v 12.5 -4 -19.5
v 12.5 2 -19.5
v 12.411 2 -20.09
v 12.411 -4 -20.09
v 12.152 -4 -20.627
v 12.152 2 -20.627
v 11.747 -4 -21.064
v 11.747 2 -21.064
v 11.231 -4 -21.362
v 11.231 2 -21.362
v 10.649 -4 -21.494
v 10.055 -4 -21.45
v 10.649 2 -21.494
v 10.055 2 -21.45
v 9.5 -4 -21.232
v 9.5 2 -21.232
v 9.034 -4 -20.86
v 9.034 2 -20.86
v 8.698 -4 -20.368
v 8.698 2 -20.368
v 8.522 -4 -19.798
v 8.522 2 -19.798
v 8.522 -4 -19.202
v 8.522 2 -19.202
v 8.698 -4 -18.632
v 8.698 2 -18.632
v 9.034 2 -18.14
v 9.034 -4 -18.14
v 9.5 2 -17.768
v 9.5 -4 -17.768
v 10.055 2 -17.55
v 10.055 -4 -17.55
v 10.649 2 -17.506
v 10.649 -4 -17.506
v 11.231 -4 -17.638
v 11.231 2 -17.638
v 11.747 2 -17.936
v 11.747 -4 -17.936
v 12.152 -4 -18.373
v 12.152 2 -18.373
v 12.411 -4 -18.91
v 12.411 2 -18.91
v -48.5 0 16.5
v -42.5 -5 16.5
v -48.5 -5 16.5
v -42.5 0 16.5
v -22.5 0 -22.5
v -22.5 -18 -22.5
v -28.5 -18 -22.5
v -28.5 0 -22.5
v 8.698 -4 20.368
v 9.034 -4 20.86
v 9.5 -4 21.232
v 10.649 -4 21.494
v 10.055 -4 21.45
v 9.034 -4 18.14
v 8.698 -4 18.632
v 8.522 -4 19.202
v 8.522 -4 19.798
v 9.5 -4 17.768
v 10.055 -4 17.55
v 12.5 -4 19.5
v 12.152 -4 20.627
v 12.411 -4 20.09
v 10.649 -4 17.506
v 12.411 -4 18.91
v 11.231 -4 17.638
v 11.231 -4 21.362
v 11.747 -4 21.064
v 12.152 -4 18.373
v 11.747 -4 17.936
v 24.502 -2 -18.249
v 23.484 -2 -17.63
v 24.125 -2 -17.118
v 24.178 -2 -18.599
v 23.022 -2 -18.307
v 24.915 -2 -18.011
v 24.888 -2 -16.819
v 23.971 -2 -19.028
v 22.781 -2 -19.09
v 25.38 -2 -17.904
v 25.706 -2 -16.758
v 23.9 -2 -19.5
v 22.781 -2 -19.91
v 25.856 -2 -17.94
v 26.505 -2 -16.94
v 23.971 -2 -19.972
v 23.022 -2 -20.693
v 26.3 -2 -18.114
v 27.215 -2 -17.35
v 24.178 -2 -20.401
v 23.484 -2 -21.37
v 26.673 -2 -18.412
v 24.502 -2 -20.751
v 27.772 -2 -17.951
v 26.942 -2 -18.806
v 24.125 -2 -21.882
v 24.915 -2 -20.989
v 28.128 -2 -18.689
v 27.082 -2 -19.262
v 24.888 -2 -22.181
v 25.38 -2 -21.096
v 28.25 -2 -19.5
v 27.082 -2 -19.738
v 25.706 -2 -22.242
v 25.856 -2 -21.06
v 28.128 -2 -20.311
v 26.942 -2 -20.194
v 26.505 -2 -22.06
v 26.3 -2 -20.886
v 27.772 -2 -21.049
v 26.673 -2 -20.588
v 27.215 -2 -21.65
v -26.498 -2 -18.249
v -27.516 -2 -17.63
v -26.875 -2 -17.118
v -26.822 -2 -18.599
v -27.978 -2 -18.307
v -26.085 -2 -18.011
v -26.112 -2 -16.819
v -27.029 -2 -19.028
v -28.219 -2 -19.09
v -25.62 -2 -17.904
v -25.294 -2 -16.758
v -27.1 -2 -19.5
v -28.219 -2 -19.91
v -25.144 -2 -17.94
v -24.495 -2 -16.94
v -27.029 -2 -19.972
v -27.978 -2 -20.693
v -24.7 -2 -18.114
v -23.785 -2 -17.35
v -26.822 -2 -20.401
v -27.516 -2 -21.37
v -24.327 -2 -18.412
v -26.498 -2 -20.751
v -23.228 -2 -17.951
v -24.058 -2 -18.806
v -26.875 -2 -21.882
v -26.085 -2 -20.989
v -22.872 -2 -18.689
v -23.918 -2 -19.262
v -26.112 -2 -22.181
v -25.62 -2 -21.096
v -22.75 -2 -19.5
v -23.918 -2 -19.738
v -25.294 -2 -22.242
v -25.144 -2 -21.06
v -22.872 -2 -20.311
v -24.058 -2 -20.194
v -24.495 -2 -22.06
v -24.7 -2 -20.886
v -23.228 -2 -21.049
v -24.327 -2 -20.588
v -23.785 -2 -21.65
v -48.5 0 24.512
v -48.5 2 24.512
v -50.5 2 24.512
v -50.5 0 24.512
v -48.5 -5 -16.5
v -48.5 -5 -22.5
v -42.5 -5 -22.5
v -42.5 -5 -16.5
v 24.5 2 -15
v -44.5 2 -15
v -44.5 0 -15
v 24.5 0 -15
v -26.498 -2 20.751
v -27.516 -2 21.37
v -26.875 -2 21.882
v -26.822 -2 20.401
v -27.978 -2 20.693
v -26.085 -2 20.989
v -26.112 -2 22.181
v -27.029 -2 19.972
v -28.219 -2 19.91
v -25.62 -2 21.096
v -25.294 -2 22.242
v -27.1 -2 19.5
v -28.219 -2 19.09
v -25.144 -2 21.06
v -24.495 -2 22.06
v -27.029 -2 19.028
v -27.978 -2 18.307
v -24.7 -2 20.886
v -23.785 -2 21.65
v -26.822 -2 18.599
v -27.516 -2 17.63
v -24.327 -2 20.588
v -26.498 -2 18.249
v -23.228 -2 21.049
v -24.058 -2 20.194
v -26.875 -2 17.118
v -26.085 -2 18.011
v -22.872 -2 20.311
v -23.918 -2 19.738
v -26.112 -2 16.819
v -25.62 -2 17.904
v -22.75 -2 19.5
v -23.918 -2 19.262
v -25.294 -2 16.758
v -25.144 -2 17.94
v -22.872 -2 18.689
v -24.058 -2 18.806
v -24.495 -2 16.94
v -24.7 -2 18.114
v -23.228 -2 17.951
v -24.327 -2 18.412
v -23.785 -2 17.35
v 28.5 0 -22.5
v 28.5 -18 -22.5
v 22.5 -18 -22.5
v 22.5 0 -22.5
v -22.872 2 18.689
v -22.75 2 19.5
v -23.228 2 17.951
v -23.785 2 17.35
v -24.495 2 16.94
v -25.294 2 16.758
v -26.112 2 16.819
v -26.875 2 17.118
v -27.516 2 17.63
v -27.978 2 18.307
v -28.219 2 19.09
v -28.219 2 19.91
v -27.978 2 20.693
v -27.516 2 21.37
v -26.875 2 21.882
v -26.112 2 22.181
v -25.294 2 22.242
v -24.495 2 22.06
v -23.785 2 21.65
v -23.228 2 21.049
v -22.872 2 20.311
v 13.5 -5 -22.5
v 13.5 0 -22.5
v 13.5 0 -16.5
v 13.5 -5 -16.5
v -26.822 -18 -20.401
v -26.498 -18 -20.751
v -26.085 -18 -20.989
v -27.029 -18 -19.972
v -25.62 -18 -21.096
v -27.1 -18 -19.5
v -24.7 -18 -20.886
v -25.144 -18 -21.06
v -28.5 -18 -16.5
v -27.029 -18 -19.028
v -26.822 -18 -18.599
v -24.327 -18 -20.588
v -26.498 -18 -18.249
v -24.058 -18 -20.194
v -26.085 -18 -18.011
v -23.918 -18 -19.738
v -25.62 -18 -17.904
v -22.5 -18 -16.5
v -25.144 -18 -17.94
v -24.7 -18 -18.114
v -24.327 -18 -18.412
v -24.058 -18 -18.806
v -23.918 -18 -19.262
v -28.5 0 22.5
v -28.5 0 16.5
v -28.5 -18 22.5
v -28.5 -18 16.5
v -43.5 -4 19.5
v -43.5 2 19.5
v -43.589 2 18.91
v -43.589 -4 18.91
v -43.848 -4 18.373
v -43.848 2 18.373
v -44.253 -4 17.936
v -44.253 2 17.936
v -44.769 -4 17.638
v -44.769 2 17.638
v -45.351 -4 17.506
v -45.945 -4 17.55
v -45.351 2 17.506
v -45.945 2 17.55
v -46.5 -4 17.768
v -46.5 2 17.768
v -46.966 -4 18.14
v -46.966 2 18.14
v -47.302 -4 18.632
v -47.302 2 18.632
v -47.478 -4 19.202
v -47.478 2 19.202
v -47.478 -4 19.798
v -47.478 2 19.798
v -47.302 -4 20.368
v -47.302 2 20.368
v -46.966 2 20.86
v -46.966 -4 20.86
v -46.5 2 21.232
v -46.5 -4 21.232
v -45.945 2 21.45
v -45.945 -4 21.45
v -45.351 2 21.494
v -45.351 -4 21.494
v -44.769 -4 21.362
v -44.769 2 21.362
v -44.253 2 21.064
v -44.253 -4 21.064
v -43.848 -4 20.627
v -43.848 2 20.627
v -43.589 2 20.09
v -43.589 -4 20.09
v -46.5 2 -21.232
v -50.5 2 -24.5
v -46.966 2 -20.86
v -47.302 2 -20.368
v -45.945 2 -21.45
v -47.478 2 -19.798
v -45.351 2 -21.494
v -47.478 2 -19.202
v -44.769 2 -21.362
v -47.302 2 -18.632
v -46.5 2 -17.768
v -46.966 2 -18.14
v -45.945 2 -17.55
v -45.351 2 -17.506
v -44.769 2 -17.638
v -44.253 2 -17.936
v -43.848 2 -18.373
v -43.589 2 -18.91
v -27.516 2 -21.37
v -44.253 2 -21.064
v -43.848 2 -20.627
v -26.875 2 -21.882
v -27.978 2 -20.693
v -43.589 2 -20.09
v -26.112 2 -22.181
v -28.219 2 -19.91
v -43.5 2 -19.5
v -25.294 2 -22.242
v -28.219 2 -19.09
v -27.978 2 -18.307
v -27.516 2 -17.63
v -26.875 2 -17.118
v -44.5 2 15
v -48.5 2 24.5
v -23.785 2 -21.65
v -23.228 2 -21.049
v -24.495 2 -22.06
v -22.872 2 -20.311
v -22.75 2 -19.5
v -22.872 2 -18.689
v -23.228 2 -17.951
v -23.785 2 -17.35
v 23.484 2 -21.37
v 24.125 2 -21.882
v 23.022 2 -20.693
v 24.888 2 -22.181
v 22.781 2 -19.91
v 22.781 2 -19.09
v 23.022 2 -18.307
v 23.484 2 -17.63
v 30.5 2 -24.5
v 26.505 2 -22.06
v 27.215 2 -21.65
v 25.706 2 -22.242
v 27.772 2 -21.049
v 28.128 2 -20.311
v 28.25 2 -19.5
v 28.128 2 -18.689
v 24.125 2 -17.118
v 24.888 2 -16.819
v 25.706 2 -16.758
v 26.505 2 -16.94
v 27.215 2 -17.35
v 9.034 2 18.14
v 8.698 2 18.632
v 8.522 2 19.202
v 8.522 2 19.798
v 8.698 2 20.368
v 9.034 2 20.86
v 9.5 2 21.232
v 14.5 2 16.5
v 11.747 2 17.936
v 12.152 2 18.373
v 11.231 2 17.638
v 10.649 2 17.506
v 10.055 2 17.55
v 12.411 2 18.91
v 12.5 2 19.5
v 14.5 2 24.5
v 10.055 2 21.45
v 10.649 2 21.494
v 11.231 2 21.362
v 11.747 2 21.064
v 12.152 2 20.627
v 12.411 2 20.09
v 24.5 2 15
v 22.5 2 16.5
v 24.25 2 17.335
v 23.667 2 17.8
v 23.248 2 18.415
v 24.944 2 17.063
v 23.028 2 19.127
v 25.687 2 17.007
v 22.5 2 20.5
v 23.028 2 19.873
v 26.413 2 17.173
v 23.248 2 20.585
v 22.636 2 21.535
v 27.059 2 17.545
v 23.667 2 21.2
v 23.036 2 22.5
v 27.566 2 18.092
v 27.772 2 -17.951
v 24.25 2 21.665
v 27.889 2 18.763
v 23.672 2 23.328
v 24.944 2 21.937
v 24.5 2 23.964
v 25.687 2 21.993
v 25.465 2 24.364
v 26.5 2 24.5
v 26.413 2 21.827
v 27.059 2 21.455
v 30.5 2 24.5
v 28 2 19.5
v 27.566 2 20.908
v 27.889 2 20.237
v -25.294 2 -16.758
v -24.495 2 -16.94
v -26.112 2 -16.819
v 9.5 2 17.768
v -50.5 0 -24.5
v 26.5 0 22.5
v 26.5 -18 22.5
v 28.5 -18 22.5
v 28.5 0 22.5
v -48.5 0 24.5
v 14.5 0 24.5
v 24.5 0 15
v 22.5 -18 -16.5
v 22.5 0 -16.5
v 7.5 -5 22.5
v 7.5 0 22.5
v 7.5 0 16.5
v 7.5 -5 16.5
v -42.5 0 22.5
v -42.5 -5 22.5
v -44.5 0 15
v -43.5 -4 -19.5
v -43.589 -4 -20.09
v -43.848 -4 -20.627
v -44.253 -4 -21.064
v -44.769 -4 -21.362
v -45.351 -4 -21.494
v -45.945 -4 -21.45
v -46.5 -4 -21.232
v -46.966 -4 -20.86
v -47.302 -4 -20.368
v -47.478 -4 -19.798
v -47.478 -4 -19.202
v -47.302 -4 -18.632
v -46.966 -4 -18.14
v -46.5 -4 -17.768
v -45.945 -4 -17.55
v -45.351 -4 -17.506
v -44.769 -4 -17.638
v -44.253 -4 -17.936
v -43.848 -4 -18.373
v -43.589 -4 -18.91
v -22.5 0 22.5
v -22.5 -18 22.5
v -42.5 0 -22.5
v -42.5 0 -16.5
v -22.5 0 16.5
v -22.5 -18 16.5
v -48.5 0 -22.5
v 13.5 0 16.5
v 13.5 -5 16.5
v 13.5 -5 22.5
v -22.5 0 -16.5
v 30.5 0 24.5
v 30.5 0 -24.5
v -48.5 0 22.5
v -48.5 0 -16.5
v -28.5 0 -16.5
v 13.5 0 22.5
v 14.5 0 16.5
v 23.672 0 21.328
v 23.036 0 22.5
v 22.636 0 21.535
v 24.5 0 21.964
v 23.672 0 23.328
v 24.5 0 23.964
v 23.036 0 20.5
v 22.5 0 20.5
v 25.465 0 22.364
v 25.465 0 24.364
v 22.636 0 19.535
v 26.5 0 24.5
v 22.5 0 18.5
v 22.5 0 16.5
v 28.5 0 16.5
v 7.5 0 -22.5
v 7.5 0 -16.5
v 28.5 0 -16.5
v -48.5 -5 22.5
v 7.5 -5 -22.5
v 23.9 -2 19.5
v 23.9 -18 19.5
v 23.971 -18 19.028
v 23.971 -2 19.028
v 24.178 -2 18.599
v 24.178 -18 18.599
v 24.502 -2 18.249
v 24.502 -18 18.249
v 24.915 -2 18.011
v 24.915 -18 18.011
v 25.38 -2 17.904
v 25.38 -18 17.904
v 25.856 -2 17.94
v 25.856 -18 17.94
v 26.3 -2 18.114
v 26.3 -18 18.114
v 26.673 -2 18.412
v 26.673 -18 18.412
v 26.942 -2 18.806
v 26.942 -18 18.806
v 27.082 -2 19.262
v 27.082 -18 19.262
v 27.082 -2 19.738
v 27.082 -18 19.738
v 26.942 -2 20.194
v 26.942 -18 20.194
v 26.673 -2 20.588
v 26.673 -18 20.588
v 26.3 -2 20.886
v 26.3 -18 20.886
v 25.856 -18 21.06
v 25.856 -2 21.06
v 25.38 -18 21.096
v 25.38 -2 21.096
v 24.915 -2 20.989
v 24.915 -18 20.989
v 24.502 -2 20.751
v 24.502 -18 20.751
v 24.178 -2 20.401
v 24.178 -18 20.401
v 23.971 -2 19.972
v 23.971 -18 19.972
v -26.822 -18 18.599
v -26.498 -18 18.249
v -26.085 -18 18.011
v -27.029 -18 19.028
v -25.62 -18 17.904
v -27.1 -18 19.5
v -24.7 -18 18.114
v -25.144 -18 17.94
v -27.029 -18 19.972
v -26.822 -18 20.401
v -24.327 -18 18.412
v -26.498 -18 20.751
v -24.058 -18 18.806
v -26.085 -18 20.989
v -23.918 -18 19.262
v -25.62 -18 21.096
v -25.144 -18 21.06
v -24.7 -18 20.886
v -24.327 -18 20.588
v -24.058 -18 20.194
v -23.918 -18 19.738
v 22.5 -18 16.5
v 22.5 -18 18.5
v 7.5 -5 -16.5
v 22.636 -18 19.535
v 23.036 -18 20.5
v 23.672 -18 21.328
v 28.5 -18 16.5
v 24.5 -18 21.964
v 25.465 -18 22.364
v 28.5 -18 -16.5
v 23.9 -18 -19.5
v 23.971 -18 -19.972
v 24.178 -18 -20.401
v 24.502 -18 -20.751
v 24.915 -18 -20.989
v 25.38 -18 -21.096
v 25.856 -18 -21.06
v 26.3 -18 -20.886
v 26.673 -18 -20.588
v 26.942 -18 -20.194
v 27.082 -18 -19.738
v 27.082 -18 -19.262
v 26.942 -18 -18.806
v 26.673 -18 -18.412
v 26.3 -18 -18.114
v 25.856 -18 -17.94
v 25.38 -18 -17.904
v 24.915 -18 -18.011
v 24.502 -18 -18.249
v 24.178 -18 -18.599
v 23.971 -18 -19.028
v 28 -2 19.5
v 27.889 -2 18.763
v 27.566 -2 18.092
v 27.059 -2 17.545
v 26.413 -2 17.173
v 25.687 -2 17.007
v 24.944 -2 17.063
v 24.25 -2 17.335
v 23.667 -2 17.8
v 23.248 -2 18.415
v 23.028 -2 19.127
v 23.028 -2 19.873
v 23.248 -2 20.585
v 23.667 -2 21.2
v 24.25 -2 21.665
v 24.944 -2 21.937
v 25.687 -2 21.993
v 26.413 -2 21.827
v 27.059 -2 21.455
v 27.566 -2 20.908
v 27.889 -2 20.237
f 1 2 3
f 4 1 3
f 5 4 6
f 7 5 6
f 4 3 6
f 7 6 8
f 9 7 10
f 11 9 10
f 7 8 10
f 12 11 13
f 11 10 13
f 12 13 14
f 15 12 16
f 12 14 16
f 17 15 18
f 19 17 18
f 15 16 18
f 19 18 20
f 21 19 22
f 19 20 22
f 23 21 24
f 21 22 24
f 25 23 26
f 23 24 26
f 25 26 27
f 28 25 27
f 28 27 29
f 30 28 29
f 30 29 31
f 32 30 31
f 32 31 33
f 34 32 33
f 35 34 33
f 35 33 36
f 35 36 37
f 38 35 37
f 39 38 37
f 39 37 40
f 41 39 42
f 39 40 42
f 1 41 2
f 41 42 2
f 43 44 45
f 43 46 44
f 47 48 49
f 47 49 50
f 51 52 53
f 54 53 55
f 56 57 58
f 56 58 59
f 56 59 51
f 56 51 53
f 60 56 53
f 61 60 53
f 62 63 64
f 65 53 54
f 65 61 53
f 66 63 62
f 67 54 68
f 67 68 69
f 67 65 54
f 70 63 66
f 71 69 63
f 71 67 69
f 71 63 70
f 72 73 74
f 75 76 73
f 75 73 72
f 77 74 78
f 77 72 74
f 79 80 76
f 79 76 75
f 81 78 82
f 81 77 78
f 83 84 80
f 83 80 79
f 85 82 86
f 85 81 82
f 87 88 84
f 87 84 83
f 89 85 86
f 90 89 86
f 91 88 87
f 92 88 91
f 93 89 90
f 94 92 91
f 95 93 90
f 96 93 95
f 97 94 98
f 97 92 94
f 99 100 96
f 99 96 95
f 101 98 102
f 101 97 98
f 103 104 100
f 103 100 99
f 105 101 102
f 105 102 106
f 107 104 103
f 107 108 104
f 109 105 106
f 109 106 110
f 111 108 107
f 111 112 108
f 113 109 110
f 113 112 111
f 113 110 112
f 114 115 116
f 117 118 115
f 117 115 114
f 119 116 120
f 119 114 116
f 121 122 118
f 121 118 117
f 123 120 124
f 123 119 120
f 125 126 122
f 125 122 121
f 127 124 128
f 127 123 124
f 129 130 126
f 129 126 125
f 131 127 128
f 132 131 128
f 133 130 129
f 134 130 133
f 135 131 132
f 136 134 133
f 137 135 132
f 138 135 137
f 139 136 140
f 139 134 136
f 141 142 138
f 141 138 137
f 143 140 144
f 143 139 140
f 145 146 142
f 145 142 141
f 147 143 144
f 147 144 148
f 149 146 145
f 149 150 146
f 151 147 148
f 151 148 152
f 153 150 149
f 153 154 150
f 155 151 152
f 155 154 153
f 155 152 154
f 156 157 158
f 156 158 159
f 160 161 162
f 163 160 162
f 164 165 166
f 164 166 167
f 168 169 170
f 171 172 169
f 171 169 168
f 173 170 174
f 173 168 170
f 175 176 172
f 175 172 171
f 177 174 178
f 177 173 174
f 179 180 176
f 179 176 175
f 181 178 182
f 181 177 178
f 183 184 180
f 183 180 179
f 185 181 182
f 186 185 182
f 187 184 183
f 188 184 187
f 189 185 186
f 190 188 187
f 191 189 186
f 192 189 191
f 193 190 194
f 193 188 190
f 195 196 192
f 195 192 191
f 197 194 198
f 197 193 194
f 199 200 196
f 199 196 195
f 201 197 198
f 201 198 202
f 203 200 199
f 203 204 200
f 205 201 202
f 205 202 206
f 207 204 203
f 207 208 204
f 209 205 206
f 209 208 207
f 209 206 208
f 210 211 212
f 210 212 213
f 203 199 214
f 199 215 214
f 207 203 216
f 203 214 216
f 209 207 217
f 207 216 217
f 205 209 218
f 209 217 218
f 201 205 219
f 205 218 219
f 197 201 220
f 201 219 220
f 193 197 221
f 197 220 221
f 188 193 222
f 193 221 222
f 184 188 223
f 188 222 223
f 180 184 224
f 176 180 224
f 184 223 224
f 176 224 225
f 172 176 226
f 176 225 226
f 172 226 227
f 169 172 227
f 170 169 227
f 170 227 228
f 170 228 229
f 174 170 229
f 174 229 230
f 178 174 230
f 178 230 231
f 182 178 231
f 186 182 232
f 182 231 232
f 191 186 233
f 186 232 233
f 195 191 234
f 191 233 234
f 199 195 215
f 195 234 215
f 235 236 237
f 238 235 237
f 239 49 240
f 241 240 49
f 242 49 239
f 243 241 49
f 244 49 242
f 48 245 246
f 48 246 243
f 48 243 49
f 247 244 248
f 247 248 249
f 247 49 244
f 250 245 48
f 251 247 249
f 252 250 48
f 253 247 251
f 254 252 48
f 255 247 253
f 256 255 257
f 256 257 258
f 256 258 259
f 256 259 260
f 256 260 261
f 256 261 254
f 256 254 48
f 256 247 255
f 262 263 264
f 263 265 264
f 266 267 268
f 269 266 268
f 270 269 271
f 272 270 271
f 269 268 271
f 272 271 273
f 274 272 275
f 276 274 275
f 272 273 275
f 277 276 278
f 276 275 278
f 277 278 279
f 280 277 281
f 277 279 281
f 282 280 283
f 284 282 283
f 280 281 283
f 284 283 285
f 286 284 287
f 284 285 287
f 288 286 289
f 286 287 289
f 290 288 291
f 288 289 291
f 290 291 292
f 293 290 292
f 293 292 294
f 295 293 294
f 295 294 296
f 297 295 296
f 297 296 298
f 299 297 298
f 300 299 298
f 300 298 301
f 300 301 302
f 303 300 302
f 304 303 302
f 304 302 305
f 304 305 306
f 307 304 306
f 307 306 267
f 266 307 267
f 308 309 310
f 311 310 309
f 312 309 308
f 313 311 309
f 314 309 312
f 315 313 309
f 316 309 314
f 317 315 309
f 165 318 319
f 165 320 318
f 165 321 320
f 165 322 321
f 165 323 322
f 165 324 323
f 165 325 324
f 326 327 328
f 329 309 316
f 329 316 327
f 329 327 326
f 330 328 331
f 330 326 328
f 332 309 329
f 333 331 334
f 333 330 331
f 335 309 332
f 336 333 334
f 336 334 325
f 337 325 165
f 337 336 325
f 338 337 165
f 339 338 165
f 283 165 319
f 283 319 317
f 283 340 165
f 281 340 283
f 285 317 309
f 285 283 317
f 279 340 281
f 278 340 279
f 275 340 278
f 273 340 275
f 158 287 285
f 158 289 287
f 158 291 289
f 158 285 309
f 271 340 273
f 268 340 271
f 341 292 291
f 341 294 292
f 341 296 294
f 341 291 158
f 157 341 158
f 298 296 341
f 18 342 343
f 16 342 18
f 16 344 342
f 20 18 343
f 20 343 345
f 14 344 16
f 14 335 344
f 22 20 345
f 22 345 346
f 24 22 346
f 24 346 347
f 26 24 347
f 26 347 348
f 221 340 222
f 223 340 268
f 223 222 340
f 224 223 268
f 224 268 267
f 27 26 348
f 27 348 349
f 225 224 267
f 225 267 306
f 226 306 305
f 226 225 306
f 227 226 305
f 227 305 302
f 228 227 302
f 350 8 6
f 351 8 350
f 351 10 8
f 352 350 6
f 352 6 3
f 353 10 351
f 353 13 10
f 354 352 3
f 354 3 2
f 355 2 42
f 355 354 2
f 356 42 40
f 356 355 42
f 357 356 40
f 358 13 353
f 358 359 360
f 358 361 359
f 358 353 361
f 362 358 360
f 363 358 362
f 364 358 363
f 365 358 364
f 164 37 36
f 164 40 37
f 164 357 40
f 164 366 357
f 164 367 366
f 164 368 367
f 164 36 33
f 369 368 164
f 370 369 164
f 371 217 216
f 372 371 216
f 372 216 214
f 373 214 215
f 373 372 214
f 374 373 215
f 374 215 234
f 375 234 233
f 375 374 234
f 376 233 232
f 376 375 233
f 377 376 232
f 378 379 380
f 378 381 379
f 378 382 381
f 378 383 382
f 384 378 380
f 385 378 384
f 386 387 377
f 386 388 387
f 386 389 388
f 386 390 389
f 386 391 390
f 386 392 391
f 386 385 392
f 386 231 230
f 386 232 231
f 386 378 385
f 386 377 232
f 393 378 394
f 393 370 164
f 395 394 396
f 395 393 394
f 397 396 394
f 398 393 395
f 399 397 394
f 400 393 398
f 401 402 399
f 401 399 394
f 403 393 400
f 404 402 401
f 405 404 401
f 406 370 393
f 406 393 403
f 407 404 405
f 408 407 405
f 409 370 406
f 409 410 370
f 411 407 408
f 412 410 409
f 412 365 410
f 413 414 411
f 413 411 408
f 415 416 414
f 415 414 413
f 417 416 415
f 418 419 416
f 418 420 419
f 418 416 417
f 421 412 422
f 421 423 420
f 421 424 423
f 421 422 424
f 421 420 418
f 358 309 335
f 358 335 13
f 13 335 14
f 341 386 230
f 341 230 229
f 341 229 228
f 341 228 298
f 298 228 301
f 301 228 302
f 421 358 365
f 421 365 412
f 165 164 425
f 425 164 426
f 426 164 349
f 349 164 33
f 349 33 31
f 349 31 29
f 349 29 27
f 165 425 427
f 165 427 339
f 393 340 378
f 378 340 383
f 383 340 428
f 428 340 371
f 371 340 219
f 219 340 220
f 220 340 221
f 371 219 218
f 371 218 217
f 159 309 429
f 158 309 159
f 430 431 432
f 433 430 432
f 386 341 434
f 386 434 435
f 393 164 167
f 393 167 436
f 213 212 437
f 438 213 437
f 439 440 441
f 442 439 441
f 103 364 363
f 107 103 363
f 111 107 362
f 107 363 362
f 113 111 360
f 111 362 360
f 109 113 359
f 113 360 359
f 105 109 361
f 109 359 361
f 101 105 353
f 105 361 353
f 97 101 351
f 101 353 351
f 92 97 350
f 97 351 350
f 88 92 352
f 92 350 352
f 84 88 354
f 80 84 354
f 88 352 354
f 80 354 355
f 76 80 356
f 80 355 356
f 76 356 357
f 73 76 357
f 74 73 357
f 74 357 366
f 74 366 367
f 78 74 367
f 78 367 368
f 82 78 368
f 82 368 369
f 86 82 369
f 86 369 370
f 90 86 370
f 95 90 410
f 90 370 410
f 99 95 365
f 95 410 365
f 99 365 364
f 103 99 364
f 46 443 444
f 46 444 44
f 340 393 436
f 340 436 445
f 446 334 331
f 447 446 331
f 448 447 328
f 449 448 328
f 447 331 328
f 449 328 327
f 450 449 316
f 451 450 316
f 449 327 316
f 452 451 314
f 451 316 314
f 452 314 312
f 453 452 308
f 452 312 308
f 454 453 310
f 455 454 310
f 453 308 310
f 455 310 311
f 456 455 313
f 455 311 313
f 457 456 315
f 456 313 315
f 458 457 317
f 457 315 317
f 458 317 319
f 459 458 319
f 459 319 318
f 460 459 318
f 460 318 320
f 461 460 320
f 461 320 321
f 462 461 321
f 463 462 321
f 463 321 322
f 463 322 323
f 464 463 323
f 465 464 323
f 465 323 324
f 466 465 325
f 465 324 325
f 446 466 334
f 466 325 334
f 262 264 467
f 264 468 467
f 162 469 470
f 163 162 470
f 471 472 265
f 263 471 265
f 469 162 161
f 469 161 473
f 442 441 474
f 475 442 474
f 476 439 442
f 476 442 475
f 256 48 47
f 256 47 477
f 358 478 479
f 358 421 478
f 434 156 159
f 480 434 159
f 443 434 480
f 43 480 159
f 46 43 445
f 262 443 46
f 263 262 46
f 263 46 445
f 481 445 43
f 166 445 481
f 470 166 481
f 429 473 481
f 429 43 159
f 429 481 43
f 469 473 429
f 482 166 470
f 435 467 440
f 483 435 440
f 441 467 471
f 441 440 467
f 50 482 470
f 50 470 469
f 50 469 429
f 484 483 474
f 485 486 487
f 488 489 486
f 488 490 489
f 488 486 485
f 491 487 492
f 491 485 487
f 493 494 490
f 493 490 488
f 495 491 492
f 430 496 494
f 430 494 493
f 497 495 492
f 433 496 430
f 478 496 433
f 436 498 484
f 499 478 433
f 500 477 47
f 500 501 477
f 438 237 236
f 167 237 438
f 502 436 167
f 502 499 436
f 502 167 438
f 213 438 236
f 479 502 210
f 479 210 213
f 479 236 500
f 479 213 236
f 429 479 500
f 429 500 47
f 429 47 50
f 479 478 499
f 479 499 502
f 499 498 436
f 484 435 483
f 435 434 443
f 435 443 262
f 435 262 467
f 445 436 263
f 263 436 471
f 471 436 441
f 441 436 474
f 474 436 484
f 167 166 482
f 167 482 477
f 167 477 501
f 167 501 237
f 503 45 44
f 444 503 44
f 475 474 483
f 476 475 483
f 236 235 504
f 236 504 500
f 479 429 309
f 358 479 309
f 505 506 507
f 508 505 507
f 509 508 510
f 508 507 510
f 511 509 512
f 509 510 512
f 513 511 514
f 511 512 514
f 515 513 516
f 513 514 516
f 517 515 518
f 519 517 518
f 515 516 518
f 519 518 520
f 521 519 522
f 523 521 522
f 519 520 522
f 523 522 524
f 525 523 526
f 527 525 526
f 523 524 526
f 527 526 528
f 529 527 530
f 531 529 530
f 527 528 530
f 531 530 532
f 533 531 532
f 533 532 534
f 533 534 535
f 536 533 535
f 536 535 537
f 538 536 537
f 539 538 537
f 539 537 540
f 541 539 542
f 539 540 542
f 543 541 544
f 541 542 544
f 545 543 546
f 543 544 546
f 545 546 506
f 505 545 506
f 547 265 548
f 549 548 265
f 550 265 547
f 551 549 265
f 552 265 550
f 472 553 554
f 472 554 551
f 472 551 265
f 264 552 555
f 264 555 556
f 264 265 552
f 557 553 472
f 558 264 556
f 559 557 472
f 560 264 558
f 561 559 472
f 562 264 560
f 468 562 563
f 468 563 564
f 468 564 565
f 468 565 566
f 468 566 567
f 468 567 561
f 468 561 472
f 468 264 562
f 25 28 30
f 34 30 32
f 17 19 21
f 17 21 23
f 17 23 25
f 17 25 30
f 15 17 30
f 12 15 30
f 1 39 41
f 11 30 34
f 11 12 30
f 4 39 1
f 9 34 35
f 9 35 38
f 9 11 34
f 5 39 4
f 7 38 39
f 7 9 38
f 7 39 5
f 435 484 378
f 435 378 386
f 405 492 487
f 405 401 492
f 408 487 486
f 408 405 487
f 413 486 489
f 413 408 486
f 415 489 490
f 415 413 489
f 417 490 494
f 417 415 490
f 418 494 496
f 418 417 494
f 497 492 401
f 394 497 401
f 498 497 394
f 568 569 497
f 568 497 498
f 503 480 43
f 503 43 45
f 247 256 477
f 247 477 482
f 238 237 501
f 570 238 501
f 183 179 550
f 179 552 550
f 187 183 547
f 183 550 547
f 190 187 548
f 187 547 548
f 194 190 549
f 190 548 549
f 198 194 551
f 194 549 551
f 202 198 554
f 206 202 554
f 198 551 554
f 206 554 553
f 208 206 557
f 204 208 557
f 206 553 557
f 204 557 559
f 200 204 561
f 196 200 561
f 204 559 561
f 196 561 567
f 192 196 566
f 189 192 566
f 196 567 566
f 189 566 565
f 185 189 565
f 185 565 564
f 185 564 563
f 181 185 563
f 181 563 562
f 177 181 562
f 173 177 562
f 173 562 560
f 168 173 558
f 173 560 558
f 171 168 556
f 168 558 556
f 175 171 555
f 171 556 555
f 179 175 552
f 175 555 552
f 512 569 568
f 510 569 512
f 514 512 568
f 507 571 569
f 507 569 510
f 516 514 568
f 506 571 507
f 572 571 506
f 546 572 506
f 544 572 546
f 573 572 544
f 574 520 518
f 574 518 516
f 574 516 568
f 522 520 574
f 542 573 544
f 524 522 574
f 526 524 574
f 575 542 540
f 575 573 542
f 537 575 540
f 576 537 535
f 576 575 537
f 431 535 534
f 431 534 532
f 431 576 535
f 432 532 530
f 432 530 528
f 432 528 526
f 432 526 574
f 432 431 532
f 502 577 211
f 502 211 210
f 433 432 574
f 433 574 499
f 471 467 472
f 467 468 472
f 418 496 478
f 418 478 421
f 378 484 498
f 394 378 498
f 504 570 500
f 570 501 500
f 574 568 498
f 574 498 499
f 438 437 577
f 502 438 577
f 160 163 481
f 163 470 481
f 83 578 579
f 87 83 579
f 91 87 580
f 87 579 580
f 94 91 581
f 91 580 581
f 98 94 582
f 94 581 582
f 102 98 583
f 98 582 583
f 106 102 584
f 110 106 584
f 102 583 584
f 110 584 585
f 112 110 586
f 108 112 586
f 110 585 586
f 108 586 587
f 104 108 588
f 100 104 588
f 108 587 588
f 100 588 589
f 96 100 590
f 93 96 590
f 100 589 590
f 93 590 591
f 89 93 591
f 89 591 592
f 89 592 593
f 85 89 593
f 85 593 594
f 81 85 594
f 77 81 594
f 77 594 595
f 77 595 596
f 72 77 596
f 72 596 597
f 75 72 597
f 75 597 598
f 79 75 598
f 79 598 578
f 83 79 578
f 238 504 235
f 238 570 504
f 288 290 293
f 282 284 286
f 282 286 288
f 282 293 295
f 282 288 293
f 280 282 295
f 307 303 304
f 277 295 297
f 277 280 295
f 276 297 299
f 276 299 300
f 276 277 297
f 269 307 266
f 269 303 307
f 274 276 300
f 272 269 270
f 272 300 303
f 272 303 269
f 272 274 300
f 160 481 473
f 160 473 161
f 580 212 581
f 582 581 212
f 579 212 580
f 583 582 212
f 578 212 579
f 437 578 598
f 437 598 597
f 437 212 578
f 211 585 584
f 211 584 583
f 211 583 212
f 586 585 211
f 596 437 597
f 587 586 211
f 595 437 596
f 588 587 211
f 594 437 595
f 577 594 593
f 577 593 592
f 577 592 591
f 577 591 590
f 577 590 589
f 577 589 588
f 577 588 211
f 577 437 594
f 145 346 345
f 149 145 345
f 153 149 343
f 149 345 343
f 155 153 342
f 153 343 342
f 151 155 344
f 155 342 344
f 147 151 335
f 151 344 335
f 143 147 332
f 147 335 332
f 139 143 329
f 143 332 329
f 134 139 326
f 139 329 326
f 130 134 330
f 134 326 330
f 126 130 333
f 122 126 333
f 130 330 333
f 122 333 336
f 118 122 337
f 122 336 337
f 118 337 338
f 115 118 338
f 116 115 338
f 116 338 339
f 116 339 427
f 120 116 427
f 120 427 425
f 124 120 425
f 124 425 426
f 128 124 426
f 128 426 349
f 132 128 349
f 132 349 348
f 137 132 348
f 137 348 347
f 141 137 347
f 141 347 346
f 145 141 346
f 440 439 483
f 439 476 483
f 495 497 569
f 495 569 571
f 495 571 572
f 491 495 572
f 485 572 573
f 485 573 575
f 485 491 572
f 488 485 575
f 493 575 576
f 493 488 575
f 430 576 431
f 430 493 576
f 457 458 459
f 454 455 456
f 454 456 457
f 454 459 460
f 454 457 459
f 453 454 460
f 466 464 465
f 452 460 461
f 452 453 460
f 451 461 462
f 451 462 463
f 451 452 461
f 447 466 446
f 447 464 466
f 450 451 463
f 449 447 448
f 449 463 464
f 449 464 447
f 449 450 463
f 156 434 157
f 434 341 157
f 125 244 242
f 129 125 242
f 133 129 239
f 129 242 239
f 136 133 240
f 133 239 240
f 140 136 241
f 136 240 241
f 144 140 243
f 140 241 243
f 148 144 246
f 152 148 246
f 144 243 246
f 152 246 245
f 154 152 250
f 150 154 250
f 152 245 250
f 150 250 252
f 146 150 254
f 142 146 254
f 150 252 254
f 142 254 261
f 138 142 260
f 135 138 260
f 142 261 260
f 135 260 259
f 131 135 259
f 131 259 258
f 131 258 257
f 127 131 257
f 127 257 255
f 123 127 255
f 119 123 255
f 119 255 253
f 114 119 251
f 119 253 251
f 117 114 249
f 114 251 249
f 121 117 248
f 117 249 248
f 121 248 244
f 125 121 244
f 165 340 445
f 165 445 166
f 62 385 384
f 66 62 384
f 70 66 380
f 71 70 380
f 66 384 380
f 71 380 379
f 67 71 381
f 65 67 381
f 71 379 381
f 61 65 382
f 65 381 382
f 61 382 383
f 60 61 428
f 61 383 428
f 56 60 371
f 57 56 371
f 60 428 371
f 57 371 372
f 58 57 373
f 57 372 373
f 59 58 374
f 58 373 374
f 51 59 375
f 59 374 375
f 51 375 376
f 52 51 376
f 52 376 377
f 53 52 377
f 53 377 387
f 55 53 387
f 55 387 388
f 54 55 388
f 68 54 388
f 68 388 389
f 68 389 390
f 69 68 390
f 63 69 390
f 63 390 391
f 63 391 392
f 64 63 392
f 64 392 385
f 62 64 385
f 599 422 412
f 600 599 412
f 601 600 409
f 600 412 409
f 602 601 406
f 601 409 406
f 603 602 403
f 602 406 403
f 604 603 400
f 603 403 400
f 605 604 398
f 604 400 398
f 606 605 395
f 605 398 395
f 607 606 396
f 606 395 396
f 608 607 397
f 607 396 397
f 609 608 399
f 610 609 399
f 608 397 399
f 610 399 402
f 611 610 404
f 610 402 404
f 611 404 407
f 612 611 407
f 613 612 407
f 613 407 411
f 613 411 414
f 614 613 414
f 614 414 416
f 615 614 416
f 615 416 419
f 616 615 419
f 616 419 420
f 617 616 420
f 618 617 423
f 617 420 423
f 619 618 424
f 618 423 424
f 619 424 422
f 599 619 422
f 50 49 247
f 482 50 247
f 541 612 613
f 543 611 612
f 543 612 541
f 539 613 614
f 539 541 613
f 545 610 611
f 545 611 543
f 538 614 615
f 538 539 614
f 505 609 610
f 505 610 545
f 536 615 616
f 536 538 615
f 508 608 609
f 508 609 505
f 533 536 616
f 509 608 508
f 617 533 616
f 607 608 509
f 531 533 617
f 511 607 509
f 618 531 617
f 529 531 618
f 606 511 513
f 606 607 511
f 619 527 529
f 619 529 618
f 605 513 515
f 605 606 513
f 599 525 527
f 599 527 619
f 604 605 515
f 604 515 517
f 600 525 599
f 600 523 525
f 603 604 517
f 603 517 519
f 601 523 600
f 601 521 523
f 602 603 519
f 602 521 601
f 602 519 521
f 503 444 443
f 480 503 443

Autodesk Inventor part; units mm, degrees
ref_plane "YZ Plane" through (0, 0, 0) normal (1, 0, 0) x (0, 1, 0)
ref_plane "XZ Plane" through (0, 0, 0) normal (0, 1, 0) x (-1, 0, 0)
ref_plane "XY Plane" through (0, 0, 0) normal (0, 0, 1) x (1, 0, 0)
sketch "Skizze1" plane through (0, 0, 0) normal (0, 1, 0) x (-1, 0, 0)
  line L0 (28.5, 22.5) -> (-28.5, 22.5)
  line L1 (-28.5, 22.5) -> (-28.5, -22.5)
  line L2 (-28.5, -22.5) -> (28.5, -22.5)
  line L3 (28.5, -22.5) -> (28.5, 22.5)
  line L4 (-39.9, 0) -> (39.9, 0) projected
  line L5 (0, -31.5) -> (0, 31.5) projected
  circle A0 centre (-25.5, 19.5) radius 1.6
  circle A1 centre (25.5, 19.5) radius 1.6
  circle A2 centre (25.5, -19.5) radius 1.6
  circle A3 centre (-25.5, -19.5) radius 1.6
  line L6 (-28.5, 22.5) -> (-22.5, 22.5)
  line L7 (-22.5, 22.5) -> (-22.5, 16.5)
  line L8 (-22.5, 16.5) -> (-28.5, 16.5)
  line L9 (-28.5, 16.5) -> (-28.5, 22.5)
  line L10 (-14.5, 22.5) -> (-22.5, 22.5)
  line L11 (-22.5, 22.5) -> (-22.5, 16.5)
  line L12 (-22.5, 16.5) -> (-14.5, 16.5)
  line L13 (-14.5, 16.5) -> (-14.5, 22.5)
  line L14 (-28.5, -22.5) -> (-22.5, -22.5)
  line L15 (-22.5, -22.5) -> (-22.5, -16.5)
  line L16 (-22.5, -16.5) -> (-28.5, -16.5)
  line L17 (-28.5, -16.5) -> (-28.5, -22.5)
  line L18 (28.5, -22.5) -> (22.5, -22.5)
  line L19 (22.5, -22.5) -> (22.5, -16.5)
  line L20 (22.5, -16.5) -> (28.5, -16.5)
  line L21 (28.5, -16.5) -> (28.5, -22.5)
  line L22 (28.5, 22.5) -> (22.5, 22.5)
  line L23 (22.5, 22.5) -> (22.5, 16.5)
  line L24 (22.5, 16.5) -> (28.5, 16.5)
  line L25 (28.5, 16.5) -> (28.5, 22.5)
  point P0 (0, 0)
  dimension "d0" = 57
  dimension "d1" = 45
  dimension "d2" = 3.2
  dimension "d3" = 3.2
  dimension "d4" = 3.2
  dimension "d5" = 3.2
  dimension "d6" = 39
  dimension "d7" = 19.5
  dimension "d8" = 51
  dimension "d9" = 51
  dimension "d10" = 39
  dimension "d11" = 19.5
  dimension "d13" = 3
  dimension "d14" = 25.5
  dimension "d15" = 6
  dimension "d16" = 6
  dimension "d17" = 0
  dimension "d18" = 8
  dimension "d19" = 6
  dimension "d20" = 6
  dimension "d21" = 6
  dimension "d22" = 6
  dimension "d23" = 6
  dimension "d24" = 6
extrude "Extrusion1" add sketch "Skizze1" along normal blind 2 and the other way blind 23 contours L3 L24 L23 L0 | L3 L2 L19 L20 | L7 L8 L1 L0 | L16 L15 L2 L1
extrude "Extrusion2" add sketch "Skizze1" along normal blind 2 contours L23 L24 L3 L4 L5 L0 | L5 L4 L1 L8 L12 L13 L0 | L3 L20 L19 L2 L5 L4 | L5 L2 L15 L16 L1 L4
sketch "Skizze2" plane through (-28.5, -23, 22.5) normal (-1, 0, 0) x (0, 0, 1)
  line L0 (0, 0) -> (0, 25) projected
  line L1 (-45, 0) -> (-45, 25) projected
  line L2 (0, 25) -> (-45, 25)
  line L3 (-45, 25) -> (-45, 23)
  line L4 (-45, 23) -> (0, 23)
  line L5 (0, 23) -> (0, 25)
  point P0 (-22.5, 23)
extrude "Extrusion3" add sketch "Skizze2" along normal blind 20
sketch "Skizze4" plane through (0, 0, 0) normal (0, -1, 0) x (1, 0, 0)
  line L0 (-48.5, 22.5) -> (-48.5, -22.5) projected
  line L1 (-48.5, -22.5) -> (-42.5, -22.5)
  line L2 (-42.5, -22.5) -> (-42.5, -16.5)
  line L3 (-42.5, -16.5) -> (-48.5, -16.5)
  line L4 (-48.5, -16.5) -> (-48.5, -22.5)
  line L5 (-48.5, 22.5) -> (-42.5, 22.5)
  line L6 (-42.5, 22.5) -> (-42.5, 16.5)
  line L7 (-42.5, 16.5) -> (-48.5, 16.5)
  line L8 (-48.5, 16.5) -> (-48.5, 22.5)
  line L9 (22.5, -22.5) -> (-22.5, -22.5) projected
  line L10 (7.5, -22.5) -> (13.5, -22.5)
  line L11 (13.5, -22.5) -> (13.5, -16.5)
  line L12 (13.5, -16.5) -> (7.5, -16.5)
  line L13 (7.5, -16.5) -> (7.5, -22.5)
  line L14 (28.5, 16.5) -> (28.5, -16.5) projected
  line L15 (-22.5, 22.5) -> (14.5, 22.5) projected
  line L16 (13.5, 22.5) -> (7.5, 22.5)
  line L17 (7.5, 22.5) -> (7.5, 16.5)
  line L18 (7.5, 16.5) -> (13.5, 16.5)
  line L19 (13.5, 16.5) -> (13.5, 22.5)
  line L20 (28.5, 16.5) -> (28.5, 22.5) projected
  point P0 (0, 0)
  dimension "d45" = 6
  dimension "d46" = 6
  dimension "d47" = 6
  dimension "d48" = 6
  dimension "d49" = 6
  dimension "d50" = 6
  dimension "d51" = 15
  dimension "d52" = 6
  dimension "d53" = 6
  dimension "d54" = 15
extrude "Extrusion4" add sketch "Skizze4" along normal blind 5
sketch "Skizze3" plane through (0, 2, 0) normal (0, 1, 0) x (1, 0, 0)
  circle A0 centre (10.5, -19.5) radius 2
  circle A1 centre (10.5, 19.5) radius 2
  line L0 (43.9, 0) -> (-63.9, 0) projected
  line L1 (28.5, -22.5) -> (28.5, 22.5) projected
  circle A2 centre (-45.5, -19.5) radius 2
  circle A3 centre (-45.5, 19.5) radius 2
  line L2 (14.5, -22.5) -> (-48.5, -22.5) projected
  line L3 (28.5, 22.5) -> (-48.5, 22.5) projected
  point P0 (0, 0)
  dimension "d33" = 4
  dimension "d34" = 4
  dimension "d35" = 39
  dimension "d36" = 19.5
  dimension "d37" = 18
  dimension "d38" = 18
  dimension "d39" = 4
  dimension "d40" = 4
  dimension "d41" = 3
  dimension "d42" = 3
  dimension "d43" = 56
  dimension "d44" = 56
extrude "Extrusion5" cut sketch "Skizze3" against normal blind 6
sketch "Skizze5" plane through (0, -23, 0) normal (0, -1, 0) x (1, 0, 0)
  circle A0 centre (-25.5, 19.5) radius 1.6 projected
  circle A1 centre (-25.5, 19.5) radius 1.6
  line L0 (-28.5, 22.5) -> (-22.5, 22.5)
  line L1 (-22.5, 22.5) -> (-22.5, 16.5)
  line L2 (-22.5, 16.5) -> (-28.5, 16.5)
  line L3 (-28.5, 16.5) -> (-28.5, 22.5)
  line L4 (22.5, 16.5) -> (28.5, 16.5) projected
  line L5 (22.5, 22.5) -> (28.5, 22.5) projected
  line L6 (28.5, 16.5) -> (22.5, 16.5)
  line L7 (22.5, 16.5) -> (22.5, 22.5)
  line L8 (22.5, 22.5) -> (28.5, 22.5)
  line L9 (28.5, 22.5) -> (28.5, 16.5)
  circle A2 centre (25.5, 19.5) radius 1.6
  circle A3 centre (25.5, -19.5) radius 1.6 projected
  circle A4 centre (25.5, -19.5) radius 1.6
  line L10 (28.5, -22.5) -> (-48.5, -22.5) projected
  line L11 (22.5, -16.5) -> (22.5, -22.5) projected
  line L12 (28.5, -22.5) -> (22.5, -22.5)
  line L13 (22.5, -22.5) -> (22.5, -16.5)
  line L14 (22.5, -16.5) -> (28.5, -16.5)
  line L15 (28.5, -16.5) -> (28.5, -22.5)
  line L16 (-28.5, -16.5) -> (-28.5, -22.5) projected
  line L17 (-22.5, -22.5) -> (-28.5, -22.5)
  line L18 (-28.5, -22.5) -> (-28.5, -16.5)
  line L19 (-28.5, -16.5) -> (-22.5, -16.5)
  line L20 (-22.5, -16.5) -> (-22.5, -22.5)
  circle A5 centre (-25.5, -19.5) radius 1.6 projected
  circle A6 centre (-25.5, -19.5) radius 1.6
  point P0 (0, 0)
  dimension "d59" = 3.2
  dimension "d60" = 3.2
  dimension "d61" = 3.2
  dimension "d62" = 3.2
  dimension "d63" = 3
  dimension "d64" = 3
extrude "Extrusion6" cut sketch "Skizze5" against normal blind 5
sketch "Skizze6" plane through (0, 2, 0) normal (0, 1, 0) x (1, 0, 0)
  line L0 (-44.5, 15) -> (24.5, 15)
  line L1 (24.5, 15) -> (24.5, -15)
  line L2 (24.5, -15) -> (-44.5, -15)
  line L3 (-44.5, -15) -> (-44.5, 15)
  line L4 (43.9, 0) -> (-63.9, 0) projected
  line L5 (28.5, -22.5) -> (28.5, 22.5) projected
  point P0 (0, 0)
  dimension "d67" = 69
  dimension "d68" = 30
  dimension "d69" = 4
extrude "Extrusion7" cut sketch "Skizze6" against normal up to surface (2 mm away)
sketch "Skizze8" plane through (14.5, 0, 22.5) normal (0, 0, 1) x (1, 0, 0)
  line L0 (-63, 2) -> (-63, -5) projected
  line L1 (10, 0) -> (-59, 0) projected
  line L2 (-63, 2) -> (0, 2)
  line L3 (0, 2) -> (0, 0)
  line L4 (0, 0) -> (-63, 0)
  line L5 (-63, 0) -> (-63, 2)
  line L6 (8, 0) -> (14, 0) projected
  line L7 (14, 0) -> (8, 0)
  line L8 (8, 0) -> (8, 2)
  line L9 (8, 2) -> (14, 2)
  line L10 (14, 2) -> (14, 0)
  line L11 (8, 2) -> (14, 2) projected
  point P0 (-14.5, 0)
  point P1 (-63, 0)
  point P2 (-59, 0)
  point P3 (8, 0)
  dimension "d73" = 63
  dimension "d74" = 6
  dimension "d75" = 0
extrude "Extrusion8" add sketch "Skizze8" along normal blind 2
sketch "Skizze9" plane through (28.5, 2, -22.5) normal (0, 0, -1) x (-1, 0, 0)
  line L0 (0, 0) -> (6, 0) projected
  line L1 (77, -2) -> (77, -7) projected
  line L2 (0, 0) -> (77, 0)
  line L3 (77, 0) -> (77, -2)
  line L4 (77, -2) -> (0, -2)
  line L5 (0, -2) -> (0, 0)
  point P0 (28.5, -2)
extrude "Extrusion9" add sketch "Skizze9" along normal blind 2
sketch "Skizze7" plane through (0, 2, 0) normal (0, 1, 0) x (1, 0, 0)
  circle A0 centre (-25.5, -19.5) radius 1.6 projected
  circle A1 centre (-25.5, -19.5) radius 2.75
  circle A2 centre (25.5, -19.5) radius 1.6 projected
  circle A3 centre (25.5, -19.5) radius 2.5
  circle A4 centre (25.5, 19.5) radius 1.6 projected
  circle A5 centre (25.5, 19.5) radius 2.75
  circle A6 centre (-25.5, 19.5) radius 1.6 projected
  circle A7 centre (-25.5, 19.5) radius 2.75
  point P0 (0, 0)
  dimension "d72" = 5.5
  dimension "d80" = 5
  dimension "d81" = 5.5
  dimension "d82" = 5.5
sketch "Skizze10" plane through (28.5, 0, 16.5) normal (1, 0, 0) x (0, 0, -1)
  line L0 (41, 2) -> (-8, 2) projected
  line L1 (39, 0) -> (41, 0) projected
  line L2 (-8, 2) -> (41, 2)
  line L3 (41, 2) -> (41, 0)
  line L4 (41, 0) -> (-8, 0)
  line L5 (-8, 0) -> (-8, 2)
  point P0 (16.5, 0)
extrude "Extrusion10" add sketch "Skizze10" along normal blind 2
sketch "Skizze11" plane through (-48.5, -23, 22.5) normal (-1, 0, 0) x (0, 0, 1)
  line L0 (-47, 25) -> (2, 25) projected
  line L1 (2.0117, 23) -> (-47, 23)
  line L2 (-47, 23) -> (-47, 25)
  line L3 (-47, 25) -> (2.0117, 25)
  line L4 (2.0117, 25) -> (2.0117, 23)
  point P0 (-22.5, 23)
  point P1 (2, 25)
extrude "Extrusion11" add sketch "Skizze11" along normal blind 2
extrude "Extrusion12" cut sketch "Skizze7" against normal blind 4
fillet "Rundung1" radius 4 2 edges at (22.5, -9, 22.5) (22.5, 1, 24.5)
properties part number "Adapter_Spannungswandler"
